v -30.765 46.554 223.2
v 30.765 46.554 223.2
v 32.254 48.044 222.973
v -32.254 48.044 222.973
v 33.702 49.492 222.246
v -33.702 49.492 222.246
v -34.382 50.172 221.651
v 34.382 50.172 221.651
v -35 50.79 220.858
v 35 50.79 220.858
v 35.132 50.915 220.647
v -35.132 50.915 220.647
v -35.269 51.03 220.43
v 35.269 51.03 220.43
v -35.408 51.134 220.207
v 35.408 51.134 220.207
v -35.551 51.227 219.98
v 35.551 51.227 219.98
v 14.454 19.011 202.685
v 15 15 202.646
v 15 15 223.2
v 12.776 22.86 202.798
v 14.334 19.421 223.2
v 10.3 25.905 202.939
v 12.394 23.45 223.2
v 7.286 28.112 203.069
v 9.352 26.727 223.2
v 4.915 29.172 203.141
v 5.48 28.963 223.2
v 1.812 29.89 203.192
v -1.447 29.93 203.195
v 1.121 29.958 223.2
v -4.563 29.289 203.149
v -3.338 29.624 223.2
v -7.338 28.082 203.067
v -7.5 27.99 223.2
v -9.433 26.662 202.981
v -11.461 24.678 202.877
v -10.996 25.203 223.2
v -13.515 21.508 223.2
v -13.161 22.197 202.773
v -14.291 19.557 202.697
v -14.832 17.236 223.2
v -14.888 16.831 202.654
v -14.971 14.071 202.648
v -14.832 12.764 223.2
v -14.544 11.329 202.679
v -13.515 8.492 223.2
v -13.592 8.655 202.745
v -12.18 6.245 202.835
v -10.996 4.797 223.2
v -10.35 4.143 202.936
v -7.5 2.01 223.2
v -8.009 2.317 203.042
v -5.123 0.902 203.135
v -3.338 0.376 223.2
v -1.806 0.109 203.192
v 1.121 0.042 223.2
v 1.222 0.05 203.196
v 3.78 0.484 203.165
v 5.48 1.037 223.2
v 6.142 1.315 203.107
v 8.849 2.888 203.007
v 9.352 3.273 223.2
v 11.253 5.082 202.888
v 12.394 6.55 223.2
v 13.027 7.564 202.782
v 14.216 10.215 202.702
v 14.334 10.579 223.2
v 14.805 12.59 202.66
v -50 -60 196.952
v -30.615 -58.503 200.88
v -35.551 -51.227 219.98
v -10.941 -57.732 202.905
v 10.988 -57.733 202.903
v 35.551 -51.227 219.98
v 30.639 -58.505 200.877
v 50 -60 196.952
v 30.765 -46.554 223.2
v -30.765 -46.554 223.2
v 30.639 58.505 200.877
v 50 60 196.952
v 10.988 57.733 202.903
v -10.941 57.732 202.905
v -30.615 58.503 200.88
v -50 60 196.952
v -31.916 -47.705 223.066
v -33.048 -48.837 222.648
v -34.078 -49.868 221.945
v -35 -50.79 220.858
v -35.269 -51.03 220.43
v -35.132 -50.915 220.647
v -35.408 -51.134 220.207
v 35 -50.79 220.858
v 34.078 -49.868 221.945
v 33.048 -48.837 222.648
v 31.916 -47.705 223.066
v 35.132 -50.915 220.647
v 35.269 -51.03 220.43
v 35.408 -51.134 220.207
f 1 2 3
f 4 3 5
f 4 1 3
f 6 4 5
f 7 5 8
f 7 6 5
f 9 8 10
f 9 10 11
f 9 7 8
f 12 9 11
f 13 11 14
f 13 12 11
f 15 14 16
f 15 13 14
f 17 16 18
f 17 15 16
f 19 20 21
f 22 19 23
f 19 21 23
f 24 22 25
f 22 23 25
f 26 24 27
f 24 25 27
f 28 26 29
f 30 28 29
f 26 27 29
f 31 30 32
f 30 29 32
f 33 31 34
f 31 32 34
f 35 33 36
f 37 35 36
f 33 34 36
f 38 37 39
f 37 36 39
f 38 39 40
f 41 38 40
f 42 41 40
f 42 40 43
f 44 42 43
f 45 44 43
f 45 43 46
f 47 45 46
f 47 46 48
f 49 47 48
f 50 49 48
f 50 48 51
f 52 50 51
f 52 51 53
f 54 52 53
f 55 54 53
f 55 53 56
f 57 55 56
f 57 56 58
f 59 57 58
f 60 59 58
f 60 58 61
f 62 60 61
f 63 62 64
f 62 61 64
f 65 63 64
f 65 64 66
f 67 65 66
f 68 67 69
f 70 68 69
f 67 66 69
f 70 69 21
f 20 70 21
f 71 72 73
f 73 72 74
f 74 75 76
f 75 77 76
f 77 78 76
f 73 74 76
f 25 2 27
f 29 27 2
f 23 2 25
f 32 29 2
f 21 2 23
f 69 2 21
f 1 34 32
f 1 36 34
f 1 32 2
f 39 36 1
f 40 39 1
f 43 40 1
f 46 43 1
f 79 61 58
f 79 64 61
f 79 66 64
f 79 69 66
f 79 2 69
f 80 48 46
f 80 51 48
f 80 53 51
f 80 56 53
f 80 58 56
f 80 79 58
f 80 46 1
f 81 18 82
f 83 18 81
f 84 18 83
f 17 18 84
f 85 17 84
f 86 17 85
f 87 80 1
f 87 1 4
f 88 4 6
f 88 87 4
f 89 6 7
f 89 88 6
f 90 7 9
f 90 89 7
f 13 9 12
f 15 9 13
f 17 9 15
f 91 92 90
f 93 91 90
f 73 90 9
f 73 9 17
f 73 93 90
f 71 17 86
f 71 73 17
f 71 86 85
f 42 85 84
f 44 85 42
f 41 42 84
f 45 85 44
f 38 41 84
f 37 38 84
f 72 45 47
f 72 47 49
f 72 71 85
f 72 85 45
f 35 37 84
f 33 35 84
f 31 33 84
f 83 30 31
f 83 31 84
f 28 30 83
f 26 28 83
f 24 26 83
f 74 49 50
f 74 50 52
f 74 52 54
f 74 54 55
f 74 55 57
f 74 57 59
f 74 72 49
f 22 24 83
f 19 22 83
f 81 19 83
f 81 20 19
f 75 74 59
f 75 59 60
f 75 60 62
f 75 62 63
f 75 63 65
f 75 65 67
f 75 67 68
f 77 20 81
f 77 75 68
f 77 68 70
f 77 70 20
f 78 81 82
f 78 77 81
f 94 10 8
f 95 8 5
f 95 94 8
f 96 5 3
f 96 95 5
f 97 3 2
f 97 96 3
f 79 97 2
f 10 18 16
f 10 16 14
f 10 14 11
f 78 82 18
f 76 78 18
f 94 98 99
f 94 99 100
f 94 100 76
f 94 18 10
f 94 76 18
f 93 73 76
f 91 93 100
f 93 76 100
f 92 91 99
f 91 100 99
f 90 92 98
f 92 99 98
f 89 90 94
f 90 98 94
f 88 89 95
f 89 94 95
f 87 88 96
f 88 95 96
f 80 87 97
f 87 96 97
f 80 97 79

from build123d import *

# Parameters (mm, degrees)
F1_DEPTH = 60
F3_DEPTH = 75
F4_R     = 15
F5_DEPTH = 25


# Not quite as in the source:
# - a feature names something its author has since deleted; it is built from what else it names


with BuildPart() as f1:
    # F0 (on Front) → F1 (new body, symmetric)
    with BuildSketch(Plane.XZ):
        with BuildLine():
            ThreePointArc((-50, 196.9523800313), (0, 203.2), (50, 196.9523800313))
            Line((50, 196.9523800313), (35, 220.857542129))
            ThreePointArc((35, 220.857542129), (33.1846822218, 222.5753691641), (30.7647349749, 223.2))
            Line((30.7647349749, 223.2), (-30.7647349749, 223.2))
            ThreePointArc((-30.7647349749, 223.2), (-33.1846822218, 222.5753691641), (-35, 220.857542129))
            Line((-35, 220.857542129), (-50, 196.9523800313))
        make_face()
    extrude(amount=F1_DEPTH, both=True)

    # F2 (on Right) → F3 (cut, symmetric)
    with BuildSketch(Plane.YZ):
        with BuildLine():
            Line((60, 223.2), (46.5543481195, 223.2))
            ThreePointArc((46.5543481195, 223.2), (49.3915485081, 222.3170734697), (51.2267330988, 219.980117582))
            Line((51.2267330988, 219.980117582), (60, 196.9523800313))
            Line((60, 196.9523800313), (60, 223.2))
        make_face()
        with BuildLine():
            ThreePointArc((-51.2267330988, 219.980117582), (-49.3915485081, 222.3170734697), (-46.5543481195, 223.2))
            Line((-46.5543481195, 223.2), (-60, 223.2))
            Line((-60, 223.2), (-60, 196.9523800313))
            Line((-60, 196.9523800313), (-51.2267330988, 219.980117582))
        make_face()
    extrude(amount=F3_DEPTH, both=True, mode=Mode.SUBTRACT)

    # F4 (on face) → F5 (cut)
    with BuildSketch(Plane.XY.offset(223.2)):
        with Locations((0, 15)):
            Circle(F4_R)
    extrude(amount=-F5_DEPTH, mode=Mode.SUBTRACT)


solid = f1.part
